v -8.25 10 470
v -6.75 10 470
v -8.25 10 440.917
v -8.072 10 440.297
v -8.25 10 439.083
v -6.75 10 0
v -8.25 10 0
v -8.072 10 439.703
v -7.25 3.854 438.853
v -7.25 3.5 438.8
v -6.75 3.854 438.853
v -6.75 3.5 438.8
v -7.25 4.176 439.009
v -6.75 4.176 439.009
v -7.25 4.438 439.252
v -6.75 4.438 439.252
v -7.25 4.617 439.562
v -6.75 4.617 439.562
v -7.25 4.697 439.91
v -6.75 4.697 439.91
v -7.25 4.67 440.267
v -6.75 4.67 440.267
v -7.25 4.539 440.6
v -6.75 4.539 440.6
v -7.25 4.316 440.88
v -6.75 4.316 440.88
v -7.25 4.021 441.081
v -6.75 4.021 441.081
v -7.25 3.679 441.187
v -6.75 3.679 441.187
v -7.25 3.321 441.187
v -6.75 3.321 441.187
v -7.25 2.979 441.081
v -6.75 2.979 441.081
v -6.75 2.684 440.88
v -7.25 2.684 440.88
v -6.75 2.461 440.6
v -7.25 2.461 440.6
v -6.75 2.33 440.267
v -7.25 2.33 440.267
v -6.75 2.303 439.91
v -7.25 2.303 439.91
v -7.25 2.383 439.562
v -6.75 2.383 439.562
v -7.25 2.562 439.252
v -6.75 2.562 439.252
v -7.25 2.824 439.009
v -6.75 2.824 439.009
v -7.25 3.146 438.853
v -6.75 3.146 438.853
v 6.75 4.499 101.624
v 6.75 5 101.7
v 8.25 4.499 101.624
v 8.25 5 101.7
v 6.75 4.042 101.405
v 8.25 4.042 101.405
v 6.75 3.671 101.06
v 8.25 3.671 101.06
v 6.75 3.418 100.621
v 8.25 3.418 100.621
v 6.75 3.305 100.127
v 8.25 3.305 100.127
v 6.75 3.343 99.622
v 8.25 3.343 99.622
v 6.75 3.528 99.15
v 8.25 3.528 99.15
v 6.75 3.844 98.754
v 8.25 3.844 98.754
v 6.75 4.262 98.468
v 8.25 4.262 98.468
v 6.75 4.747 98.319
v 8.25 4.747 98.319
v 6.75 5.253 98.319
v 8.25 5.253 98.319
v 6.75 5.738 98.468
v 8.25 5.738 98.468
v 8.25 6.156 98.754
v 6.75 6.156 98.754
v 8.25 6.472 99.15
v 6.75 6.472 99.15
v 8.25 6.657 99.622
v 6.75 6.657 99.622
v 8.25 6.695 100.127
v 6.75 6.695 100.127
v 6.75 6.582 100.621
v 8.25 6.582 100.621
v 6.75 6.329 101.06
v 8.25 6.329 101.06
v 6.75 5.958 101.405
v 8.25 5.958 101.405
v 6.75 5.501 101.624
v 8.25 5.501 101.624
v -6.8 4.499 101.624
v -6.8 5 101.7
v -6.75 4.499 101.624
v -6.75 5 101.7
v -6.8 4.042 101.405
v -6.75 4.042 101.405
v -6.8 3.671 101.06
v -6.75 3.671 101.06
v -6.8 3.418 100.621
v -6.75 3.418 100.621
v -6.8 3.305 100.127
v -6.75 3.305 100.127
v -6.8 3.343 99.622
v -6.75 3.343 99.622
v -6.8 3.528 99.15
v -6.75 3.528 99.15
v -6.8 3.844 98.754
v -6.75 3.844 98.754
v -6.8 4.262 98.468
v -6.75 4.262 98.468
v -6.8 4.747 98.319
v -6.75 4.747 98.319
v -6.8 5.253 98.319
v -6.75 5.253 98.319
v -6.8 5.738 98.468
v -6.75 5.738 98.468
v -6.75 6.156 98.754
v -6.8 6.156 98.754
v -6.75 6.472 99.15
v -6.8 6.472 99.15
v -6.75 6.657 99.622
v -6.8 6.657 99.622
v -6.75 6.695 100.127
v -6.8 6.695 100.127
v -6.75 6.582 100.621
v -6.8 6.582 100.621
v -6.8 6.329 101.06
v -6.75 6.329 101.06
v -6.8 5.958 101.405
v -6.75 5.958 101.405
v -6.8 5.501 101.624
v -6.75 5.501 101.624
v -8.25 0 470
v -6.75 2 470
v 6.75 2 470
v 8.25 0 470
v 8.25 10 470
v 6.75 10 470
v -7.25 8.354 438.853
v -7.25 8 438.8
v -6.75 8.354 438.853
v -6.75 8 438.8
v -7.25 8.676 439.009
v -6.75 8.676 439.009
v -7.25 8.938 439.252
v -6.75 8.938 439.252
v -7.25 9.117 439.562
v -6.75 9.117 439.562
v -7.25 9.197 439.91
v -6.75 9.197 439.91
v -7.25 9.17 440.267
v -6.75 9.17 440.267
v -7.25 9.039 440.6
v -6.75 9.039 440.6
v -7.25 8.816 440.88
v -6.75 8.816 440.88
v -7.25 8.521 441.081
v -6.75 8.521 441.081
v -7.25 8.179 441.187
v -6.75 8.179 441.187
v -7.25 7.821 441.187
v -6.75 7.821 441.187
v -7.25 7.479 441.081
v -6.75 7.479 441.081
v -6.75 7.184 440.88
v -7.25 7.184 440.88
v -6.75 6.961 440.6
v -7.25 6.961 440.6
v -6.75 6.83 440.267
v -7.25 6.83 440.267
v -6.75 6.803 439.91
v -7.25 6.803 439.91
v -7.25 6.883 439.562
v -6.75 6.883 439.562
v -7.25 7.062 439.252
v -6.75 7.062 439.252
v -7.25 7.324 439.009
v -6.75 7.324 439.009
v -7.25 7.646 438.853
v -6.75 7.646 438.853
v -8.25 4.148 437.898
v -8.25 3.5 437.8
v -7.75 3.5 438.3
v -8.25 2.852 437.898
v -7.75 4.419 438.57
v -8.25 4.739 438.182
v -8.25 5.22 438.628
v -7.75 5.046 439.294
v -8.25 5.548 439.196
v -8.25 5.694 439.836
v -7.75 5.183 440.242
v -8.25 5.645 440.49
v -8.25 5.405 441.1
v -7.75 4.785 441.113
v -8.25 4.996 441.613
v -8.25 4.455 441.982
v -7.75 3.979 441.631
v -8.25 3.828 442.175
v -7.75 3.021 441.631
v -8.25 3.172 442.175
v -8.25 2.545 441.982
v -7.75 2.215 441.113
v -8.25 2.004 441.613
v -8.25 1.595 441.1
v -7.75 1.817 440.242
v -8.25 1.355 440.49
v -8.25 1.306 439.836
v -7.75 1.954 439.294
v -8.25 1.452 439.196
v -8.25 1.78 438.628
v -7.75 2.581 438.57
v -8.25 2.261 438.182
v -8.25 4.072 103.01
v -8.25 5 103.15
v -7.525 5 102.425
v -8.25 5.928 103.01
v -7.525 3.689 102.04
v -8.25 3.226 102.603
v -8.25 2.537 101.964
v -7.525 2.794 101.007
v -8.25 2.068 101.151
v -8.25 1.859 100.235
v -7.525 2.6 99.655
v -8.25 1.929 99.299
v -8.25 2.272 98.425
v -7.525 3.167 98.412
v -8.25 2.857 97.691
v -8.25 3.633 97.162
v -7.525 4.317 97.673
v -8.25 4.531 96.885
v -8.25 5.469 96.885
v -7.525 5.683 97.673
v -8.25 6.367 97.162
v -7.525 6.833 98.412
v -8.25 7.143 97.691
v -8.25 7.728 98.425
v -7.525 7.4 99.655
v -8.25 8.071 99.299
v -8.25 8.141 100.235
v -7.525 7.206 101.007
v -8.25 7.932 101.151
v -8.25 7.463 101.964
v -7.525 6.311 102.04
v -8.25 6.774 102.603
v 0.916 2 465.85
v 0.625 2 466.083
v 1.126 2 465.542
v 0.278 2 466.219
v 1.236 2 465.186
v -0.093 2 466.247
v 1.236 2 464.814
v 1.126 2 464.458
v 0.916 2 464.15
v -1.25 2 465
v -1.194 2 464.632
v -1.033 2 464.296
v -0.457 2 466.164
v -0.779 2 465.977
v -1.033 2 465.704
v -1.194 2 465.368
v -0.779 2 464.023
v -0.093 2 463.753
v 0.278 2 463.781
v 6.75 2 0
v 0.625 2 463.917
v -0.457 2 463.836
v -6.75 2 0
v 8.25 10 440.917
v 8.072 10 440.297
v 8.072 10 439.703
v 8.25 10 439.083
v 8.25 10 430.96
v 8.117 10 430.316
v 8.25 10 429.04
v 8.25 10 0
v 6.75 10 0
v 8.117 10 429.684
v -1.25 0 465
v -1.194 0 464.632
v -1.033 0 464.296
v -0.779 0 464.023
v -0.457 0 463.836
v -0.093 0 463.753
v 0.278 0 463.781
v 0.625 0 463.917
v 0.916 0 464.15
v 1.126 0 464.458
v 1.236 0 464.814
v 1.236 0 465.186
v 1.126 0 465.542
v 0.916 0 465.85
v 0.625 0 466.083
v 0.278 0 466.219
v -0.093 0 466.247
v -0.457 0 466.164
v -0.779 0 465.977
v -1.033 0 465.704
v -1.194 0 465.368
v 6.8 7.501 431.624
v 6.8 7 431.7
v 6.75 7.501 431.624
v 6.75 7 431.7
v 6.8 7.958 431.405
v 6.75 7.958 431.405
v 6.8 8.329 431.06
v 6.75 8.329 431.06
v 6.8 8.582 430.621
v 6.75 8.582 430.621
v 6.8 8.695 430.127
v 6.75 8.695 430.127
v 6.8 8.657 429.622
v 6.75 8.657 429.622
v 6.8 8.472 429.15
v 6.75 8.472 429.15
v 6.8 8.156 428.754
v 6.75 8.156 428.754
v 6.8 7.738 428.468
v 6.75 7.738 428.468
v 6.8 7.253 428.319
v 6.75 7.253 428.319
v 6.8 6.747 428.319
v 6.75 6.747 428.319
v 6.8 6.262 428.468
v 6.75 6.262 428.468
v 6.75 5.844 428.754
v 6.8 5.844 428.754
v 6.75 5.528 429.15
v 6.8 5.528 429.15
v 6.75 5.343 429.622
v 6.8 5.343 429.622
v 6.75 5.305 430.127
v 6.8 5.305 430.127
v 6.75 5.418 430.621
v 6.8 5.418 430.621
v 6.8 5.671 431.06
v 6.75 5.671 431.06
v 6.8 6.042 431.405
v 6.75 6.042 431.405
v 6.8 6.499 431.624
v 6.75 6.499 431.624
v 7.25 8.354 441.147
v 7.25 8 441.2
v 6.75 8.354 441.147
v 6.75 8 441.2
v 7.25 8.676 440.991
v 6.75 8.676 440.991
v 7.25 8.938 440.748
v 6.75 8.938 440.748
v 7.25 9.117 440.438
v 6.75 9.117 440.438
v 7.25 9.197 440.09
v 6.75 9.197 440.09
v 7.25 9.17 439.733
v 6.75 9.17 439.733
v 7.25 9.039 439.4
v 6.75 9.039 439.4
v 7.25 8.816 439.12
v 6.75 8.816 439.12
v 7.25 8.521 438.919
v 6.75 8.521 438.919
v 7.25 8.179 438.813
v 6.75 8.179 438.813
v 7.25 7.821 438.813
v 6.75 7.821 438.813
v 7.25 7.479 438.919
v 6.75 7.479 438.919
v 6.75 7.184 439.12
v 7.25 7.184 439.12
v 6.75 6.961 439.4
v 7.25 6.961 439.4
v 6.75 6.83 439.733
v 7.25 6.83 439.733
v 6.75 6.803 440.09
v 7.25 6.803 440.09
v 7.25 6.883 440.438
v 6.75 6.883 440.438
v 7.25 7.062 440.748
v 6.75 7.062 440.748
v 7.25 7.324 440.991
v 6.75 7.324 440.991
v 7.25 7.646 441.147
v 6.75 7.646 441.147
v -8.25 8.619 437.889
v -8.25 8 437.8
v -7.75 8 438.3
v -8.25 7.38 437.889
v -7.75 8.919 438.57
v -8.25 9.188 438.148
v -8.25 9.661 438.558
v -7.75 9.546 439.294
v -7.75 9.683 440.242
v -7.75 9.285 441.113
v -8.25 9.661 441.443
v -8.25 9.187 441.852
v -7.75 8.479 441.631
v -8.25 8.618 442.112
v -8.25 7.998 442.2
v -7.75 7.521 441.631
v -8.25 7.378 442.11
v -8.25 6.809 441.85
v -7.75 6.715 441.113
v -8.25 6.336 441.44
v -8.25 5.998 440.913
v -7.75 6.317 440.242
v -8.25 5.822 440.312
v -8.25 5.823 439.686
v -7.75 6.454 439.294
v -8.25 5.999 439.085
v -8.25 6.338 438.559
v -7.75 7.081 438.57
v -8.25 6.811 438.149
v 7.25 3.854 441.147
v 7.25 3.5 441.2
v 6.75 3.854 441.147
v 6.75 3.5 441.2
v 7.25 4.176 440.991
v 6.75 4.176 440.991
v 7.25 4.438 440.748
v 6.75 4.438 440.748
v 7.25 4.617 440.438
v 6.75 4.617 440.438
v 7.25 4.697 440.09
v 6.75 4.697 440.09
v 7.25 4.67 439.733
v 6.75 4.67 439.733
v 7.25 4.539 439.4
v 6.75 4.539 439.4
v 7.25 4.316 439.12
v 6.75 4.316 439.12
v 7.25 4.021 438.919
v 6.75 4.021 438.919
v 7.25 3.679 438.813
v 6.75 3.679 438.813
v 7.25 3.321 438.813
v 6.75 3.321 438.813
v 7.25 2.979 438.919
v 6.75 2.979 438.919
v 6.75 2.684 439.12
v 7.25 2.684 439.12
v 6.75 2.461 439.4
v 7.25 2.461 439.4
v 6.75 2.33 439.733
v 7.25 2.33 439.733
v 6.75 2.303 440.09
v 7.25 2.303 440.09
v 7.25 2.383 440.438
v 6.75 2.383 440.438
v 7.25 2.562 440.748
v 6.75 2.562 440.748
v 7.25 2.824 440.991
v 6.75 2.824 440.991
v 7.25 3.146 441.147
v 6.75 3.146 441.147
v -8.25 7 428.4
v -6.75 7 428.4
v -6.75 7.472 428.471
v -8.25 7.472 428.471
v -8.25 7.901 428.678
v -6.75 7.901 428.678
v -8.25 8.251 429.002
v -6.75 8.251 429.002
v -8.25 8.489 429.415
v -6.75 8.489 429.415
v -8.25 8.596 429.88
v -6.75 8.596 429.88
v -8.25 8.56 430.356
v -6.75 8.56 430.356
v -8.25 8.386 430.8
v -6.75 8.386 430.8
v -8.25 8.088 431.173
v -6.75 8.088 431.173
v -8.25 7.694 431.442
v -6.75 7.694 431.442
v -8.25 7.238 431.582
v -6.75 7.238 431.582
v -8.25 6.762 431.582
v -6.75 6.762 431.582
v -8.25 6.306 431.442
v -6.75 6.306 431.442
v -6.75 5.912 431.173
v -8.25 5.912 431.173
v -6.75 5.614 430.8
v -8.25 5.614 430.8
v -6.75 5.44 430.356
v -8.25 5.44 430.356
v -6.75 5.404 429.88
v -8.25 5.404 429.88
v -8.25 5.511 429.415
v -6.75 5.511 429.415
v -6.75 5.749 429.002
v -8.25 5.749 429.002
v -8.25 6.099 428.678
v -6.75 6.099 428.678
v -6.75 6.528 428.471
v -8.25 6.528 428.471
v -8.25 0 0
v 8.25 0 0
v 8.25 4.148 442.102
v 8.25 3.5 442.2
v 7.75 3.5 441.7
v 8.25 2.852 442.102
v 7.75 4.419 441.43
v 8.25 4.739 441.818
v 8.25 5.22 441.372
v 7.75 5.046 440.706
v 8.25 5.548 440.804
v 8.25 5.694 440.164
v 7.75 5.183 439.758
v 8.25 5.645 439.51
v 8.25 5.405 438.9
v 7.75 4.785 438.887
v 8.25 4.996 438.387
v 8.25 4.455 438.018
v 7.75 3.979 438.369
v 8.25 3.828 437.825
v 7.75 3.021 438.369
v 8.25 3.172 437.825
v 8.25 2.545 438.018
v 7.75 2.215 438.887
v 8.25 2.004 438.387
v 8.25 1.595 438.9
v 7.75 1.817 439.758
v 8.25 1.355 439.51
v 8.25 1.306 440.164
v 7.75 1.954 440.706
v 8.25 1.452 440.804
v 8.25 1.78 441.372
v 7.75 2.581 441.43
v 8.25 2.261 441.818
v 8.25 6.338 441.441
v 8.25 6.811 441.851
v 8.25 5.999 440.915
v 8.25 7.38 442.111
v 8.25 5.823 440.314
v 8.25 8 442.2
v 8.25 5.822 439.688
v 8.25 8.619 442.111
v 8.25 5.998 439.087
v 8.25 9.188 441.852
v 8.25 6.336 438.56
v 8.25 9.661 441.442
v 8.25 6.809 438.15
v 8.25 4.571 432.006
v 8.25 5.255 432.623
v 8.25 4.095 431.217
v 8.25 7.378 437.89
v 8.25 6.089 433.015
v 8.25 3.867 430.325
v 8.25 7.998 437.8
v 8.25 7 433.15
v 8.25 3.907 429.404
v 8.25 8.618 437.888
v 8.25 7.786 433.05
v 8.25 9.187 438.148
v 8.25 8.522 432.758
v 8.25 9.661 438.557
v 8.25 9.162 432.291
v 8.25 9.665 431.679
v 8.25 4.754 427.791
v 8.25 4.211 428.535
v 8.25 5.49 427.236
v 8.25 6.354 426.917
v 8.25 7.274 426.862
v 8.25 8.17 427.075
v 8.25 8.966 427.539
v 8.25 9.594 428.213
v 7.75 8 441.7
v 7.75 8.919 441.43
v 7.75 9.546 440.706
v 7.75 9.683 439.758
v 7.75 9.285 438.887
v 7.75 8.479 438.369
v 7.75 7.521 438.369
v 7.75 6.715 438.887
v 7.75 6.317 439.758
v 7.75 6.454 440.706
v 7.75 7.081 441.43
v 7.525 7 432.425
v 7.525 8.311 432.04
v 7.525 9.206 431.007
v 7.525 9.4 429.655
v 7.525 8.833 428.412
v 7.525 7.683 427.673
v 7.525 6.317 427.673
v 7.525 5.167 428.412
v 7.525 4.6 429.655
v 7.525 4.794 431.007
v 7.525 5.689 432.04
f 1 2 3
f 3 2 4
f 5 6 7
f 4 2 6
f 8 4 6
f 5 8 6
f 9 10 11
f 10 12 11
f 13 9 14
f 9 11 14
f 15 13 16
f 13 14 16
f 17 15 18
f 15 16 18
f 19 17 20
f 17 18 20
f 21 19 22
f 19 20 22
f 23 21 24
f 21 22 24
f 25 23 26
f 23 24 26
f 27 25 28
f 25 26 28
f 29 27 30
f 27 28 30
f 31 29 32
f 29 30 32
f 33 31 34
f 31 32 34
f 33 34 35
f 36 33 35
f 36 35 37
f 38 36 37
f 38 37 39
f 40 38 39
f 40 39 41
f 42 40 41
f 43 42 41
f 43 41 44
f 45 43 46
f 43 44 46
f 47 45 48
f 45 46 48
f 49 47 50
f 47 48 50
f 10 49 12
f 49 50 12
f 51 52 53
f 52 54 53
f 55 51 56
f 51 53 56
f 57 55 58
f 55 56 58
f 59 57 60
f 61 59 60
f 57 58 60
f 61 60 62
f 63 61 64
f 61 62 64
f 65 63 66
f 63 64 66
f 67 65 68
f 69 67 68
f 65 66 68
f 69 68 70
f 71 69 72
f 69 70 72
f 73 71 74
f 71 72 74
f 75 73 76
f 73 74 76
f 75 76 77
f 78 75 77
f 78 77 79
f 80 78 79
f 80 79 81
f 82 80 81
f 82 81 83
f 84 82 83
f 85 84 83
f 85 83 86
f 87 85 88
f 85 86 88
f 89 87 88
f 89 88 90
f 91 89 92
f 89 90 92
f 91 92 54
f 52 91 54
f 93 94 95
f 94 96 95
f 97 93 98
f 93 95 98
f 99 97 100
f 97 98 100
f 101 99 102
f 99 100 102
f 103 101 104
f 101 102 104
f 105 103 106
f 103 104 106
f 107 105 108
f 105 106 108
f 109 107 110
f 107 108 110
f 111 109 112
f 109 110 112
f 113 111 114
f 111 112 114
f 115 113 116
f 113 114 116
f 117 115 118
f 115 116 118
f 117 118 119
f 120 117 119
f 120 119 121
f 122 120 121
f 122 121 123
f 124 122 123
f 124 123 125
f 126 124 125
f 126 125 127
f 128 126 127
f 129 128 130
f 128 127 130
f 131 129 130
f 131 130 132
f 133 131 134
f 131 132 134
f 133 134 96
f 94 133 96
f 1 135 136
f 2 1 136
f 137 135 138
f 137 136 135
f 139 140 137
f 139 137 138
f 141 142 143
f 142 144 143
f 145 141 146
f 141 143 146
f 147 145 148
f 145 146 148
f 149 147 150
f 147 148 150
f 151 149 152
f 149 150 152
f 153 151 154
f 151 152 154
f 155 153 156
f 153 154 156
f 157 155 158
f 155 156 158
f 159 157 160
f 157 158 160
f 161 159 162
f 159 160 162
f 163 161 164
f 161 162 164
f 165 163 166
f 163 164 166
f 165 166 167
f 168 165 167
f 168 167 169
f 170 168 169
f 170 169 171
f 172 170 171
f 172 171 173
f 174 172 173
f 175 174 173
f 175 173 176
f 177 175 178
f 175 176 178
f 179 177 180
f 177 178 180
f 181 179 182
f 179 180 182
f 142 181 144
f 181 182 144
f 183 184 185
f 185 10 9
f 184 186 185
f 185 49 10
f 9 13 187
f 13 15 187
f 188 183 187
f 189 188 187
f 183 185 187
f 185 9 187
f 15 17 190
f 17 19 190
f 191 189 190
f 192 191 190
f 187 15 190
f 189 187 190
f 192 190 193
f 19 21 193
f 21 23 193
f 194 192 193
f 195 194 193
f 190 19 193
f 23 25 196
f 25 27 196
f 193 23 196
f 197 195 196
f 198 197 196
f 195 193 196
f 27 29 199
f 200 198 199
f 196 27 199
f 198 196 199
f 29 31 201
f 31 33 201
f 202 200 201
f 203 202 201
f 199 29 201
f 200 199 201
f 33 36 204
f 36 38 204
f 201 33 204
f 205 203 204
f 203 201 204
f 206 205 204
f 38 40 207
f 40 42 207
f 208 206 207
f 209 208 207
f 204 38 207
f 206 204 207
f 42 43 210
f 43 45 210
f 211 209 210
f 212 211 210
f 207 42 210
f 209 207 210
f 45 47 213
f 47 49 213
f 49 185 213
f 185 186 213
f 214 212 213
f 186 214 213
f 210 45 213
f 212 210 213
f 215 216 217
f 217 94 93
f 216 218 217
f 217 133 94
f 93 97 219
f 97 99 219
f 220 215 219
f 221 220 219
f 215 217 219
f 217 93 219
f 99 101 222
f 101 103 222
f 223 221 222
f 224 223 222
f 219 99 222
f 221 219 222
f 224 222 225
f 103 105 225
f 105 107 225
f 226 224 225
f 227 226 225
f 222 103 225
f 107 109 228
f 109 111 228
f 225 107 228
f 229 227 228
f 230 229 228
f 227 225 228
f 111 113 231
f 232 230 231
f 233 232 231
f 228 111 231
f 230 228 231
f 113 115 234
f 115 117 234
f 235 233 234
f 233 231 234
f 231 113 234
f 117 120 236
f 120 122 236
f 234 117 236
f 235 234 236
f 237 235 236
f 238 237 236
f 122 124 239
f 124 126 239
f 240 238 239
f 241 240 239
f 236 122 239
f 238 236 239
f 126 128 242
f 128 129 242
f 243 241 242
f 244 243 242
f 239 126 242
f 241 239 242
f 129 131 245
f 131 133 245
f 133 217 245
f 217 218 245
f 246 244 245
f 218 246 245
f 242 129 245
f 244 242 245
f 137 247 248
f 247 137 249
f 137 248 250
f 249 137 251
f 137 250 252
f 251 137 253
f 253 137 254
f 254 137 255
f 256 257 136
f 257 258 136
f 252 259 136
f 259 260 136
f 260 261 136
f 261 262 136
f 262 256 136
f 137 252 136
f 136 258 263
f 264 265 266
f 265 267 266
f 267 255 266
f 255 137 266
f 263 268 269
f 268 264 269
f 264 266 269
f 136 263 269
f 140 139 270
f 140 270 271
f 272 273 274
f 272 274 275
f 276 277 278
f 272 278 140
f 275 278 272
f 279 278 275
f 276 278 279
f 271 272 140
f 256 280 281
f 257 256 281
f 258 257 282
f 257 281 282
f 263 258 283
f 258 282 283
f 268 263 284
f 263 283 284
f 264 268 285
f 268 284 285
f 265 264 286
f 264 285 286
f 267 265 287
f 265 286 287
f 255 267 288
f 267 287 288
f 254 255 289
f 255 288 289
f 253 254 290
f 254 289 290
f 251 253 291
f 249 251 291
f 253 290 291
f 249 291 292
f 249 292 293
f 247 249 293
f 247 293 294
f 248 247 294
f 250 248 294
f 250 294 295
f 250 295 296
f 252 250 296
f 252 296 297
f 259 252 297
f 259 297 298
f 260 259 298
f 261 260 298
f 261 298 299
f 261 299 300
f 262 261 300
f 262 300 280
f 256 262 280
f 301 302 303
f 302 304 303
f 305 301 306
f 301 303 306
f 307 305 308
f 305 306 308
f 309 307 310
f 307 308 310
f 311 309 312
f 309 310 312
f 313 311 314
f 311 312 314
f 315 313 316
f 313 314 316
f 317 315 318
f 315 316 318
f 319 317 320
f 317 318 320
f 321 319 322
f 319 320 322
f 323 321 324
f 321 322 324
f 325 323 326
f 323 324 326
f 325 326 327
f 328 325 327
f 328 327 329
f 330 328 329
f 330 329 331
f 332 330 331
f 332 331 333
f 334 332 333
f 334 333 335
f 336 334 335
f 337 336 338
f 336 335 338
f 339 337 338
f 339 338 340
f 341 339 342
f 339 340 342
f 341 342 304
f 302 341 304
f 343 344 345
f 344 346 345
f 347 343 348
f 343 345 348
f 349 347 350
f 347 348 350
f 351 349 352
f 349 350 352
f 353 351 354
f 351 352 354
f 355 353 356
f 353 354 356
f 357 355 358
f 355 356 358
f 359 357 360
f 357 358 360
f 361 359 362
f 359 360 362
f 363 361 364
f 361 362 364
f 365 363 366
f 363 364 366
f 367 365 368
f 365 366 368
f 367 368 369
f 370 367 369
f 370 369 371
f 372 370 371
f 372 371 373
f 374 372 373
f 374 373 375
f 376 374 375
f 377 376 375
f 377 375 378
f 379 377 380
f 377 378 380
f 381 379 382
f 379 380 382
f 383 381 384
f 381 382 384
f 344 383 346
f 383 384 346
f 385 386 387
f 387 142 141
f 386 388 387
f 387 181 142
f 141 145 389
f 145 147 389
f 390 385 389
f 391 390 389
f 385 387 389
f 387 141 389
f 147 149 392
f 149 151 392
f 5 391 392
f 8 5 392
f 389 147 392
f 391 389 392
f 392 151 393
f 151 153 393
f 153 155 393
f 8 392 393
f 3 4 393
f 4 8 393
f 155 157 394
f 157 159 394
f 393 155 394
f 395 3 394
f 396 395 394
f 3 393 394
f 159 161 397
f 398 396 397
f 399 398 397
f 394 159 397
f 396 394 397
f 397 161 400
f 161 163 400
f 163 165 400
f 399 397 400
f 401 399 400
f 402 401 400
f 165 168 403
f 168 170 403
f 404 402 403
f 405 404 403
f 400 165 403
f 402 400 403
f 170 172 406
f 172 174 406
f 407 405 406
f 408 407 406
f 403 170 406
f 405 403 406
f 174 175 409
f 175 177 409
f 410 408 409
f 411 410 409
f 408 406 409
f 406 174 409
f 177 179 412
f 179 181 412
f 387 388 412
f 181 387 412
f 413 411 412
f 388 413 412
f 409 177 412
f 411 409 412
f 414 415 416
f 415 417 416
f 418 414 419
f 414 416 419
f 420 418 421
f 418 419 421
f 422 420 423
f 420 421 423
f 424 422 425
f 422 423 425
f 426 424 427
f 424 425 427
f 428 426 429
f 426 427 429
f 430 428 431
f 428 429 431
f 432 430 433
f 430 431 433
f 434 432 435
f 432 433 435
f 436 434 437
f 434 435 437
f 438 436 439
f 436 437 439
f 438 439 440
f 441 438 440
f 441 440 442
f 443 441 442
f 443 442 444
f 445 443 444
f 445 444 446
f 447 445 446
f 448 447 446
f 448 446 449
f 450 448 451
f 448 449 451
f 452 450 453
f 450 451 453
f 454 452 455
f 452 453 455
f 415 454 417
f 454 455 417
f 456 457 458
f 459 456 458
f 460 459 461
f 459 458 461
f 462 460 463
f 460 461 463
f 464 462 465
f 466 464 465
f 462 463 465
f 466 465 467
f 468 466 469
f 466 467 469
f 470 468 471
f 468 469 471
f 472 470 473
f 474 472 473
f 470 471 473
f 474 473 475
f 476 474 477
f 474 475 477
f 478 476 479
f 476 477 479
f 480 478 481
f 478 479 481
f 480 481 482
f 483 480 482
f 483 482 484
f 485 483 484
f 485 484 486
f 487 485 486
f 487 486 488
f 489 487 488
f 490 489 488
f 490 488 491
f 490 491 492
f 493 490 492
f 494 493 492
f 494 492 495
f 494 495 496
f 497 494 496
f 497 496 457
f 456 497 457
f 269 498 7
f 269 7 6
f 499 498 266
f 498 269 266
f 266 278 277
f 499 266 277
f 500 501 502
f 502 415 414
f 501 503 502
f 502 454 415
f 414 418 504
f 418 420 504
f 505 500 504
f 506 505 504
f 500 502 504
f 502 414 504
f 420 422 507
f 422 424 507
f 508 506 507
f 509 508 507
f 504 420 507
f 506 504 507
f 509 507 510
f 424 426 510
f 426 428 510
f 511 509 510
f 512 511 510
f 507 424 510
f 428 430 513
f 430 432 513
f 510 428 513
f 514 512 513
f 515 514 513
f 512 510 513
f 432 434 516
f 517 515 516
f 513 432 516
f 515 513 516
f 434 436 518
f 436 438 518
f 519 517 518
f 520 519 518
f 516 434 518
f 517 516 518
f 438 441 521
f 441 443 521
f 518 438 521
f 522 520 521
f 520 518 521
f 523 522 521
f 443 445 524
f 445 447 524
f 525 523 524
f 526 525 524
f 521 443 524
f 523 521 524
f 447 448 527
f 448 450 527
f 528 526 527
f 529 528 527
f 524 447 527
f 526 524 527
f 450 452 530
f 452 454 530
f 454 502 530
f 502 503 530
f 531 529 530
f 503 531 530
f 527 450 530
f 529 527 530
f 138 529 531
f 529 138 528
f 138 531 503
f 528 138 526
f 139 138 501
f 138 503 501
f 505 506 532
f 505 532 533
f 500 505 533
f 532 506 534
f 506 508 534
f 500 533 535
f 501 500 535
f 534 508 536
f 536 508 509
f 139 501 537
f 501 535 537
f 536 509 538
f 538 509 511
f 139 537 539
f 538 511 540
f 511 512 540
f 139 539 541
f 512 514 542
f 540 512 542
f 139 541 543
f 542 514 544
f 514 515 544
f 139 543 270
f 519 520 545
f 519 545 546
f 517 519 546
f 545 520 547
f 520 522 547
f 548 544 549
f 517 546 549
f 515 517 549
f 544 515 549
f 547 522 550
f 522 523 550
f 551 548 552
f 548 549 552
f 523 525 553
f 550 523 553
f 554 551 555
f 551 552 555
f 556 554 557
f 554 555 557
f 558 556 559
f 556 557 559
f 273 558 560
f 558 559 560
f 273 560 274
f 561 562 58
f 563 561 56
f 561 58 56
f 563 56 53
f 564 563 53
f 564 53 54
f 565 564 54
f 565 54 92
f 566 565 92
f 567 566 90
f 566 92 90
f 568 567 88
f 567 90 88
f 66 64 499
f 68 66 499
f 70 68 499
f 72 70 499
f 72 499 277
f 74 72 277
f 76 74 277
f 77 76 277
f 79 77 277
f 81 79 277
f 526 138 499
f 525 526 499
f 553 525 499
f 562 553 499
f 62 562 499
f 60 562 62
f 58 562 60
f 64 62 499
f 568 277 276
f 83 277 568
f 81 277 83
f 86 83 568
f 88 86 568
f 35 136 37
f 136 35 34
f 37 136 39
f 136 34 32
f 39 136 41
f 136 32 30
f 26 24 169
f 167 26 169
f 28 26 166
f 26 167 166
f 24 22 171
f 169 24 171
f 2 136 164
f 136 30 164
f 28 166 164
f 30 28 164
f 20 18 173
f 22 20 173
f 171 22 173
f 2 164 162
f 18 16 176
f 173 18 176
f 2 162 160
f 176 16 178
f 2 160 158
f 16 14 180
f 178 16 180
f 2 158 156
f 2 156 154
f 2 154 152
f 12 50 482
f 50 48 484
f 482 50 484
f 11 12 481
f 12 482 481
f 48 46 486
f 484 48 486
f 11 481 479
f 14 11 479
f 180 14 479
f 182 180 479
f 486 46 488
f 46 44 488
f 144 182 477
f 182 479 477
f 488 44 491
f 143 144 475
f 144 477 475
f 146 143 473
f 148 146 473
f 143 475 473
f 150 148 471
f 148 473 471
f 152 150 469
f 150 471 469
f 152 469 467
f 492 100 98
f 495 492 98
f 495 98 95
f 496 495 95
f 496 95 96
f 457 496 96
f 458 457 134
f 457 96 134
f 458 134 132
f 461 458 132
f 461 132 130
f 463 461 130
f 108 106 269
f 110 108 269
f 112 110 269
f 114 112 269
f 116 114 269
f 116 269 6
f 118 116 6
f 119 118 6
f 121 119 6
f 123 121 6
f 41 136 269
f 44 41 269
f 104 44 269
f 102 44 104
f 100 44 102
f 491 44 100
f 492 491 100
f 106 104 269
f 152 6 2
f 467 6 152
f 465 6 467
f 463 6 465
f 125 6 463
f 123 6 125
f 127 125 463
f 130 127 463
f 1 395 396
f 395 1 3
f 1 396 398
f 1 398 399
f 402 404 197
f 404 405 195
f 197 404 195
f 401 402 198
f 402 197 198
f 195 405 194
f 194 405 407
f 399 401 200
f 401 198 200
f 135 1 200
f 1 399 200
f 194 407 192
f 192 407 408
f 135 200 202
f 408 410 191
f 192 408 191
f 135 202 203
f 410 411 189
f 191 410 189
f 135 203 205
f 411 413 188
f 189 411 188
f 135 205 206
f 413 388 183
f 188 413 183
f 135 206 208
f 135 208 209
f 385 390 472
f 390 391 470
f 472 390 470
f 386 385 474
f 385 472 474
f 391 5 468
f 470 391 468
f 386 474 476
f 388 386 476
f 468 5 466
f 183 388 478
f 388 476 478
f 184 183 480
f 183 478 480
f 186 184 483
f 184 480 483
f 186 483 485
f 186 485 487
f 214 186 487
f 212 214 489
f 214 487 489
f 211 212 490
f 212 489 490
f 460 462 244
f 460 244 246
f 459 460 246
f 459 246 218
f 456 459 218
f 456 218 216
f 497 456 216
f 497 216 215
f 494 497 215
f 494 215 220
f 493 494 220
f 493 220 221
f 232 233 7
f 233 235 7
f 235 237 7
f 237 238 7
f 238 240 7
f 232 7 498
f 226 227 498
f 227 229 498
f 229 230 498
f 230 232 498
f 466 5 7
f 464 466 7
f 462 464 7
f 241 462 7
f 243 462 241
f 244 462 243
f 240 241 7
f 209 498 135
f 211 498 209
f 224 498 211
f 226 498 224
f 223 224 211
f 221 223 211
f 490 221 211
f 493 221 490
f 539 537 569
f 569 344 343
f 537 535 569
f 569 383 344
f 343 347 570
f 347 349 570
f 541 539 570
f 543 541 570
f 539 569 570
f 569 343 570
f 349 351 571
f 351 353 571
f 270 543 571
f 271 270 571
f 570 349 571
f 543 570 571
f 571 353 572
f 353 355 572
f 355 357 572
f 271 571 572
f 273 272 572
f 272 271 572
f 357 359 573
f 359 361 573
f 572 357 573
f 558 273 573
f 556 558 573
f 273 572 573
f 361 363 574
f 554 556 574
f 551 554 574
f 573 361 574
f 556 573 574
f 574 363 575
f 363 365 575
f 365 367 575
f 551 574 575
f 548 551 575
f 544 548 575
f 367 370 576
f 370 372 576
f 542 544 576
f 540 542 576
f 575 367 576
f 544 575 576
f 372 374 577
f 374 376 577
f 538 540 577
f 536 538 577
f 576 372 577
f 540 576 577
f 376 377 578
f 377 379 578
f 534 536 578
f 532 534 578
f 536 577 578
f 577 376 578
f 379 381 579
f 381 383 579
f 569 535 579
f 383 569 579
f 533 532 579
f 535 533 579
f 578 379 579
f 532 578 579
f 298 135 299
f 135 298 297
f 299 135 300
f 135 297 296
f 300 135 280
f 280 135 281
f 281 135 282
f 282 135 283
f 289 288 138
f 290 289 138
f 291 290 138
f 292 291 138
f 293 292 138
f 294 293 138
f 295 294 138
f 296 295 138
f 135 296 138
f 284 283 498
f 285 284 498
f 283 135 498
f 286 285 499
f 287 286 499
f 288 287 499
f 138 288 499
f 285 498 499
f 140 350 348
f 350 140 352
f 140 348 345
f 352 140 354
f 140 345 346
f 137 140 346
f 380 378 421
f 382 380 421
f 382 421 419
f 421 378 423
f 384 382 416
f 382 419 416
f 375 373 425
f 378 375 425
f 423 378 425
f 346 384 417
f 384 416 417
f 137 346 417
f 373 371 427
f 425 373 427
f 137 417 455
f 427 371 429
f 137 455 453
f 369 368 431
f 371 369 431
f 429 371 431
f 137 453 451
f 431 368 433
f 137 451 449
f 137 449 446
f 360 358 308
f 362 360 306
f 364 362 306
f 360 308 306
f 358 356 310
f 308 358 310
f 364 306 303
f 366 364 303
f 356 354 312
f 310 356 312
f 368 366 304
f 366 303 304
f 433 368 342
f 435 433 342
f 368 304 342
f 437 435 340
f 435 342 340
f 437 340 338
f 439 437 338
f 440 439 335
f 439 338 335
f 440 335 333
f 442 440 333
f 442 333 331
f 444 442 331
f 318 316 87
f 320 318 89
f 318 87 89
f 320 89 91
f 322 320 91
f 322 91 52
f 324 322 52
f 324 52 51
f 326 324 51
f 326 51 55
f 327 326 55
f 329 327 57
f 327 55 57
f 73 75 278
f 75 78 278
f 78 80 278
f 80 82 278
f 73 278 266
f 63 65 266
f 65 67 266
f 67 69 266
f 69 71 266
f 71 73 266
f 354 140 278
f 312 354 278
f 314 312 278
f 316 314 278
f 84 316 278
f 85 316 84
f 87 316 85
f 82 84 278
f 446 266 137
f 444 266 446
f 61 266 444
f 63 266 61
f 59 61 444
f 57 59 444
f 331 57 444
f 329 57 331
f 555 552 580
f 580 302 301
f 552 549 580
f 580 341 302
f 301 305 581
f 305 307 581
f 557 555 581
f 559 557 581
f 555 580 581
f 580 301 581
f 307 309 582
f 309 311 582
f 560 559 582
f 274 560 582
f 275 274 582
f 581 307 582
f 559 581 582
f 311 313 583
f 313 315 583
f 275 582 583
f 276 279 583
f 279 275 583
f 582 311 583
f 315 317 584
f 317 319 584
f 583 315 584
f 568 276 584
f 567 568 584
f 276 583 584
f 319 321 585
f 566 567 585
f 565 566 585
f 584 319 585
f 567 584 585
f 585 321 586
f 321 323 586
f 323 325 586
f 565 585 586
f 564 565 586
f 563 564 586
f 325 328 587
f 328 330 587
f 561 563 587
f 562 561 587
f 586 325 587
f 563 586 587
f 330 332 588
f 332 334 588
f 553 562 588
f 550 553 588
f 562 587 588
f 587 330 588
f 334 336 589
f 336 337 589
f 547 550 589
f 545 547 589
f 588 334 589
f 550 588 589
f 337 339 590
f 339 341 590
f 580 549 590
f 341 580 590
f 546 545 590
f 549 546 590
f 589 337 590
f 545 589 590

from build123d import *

# Parameters (mm, degrees)
BOSS_EXTRU_1_DEPTH                                   = 470
ESQUISSE2_R                                          = 1.15
ESQUISSE2_R_2                                        = 1.6
ENL_V_MAT_EXTRU_1_DEPTH                              = 471.395843944
TROU_POUR_TARAUDAGE_POUR_TROU_TARAUD_M3_D            = 2.5
FORMSENKUNG_F_R_M2_SENKSCHRAUBE_MIT_SCHL_D           = 2.4
FORMSENKUNG_F_R_M2_SENKSCHRAUBE_MIT_SCHL_DEPTH       = 5
FORMSENKUNG_F_R_M2_SENKSCHRAUBE_MIT_SCHL_CSINK_D     = 4.4
FORMSENKUNG_F_R_M2_SENKSCHRAUBE_MIT_SCHL_CSINK_ANGLE = 90
FORMSENKUNG_F_R_M2_SENKSCHRAUBE_MIT_SCHL_TIP         = 0.721032743
FORMSENKUNG_F_R_M2_SENKSCHRAUBE_MIT_2_D              = 2.4
FORMSENKUNG_F_R_M2_SENKSCHRAUBE_MIT_2_DEPTH          = 5
FORMSENKUNG_F_R_M2_SENKSCHRAUBE_MIT_2_CSINK_D        = 4.4
FORMSENKUNG_F_R_M2_SENKSCHRAUBE_MIT_2_CSINK_ANGLE    = 90
FORMSENKUNG_F_R_M2_SENKSCHRAUBE_MIT_2_TIP            = 0.721032743
FORMSENKUNG_F_R_M3_SENKSCHRAUBE_MIT_SCHL_D           = 3.4
FORMSENKUNG_F_R_M3_SENKSCHRAUBE_MIT_SCHL_DEPTH       = 5
FORMSENKUNG_F_R_M3_SENKSCHRAUBE_MIT_SCHL_CSINK_D     = 6.3
FORMSENKUNG_F_R_M3_SENKSCHRAUBE_MIT_SCHL_CSINK_ANGLE = 90
FORMSENKUNG_F_R_M3_SENKSCHRAUBE_MIT_SCHL_TIP         = 1.021463052
FORMSENKUNG_F_R_M3_SENKSCHRAUBE_MIT_2_D              = 3.4
FORMSENKUNG_F_R_M3_SENKSCHRAUBE_MIT_2_CSINK_D        = 6.3
FORMSENKUNG_F_R_M3_SENKSCHRAUBE_MIT_2_CSINK_ANGLE    = 90


with BuildPart() as part:
    # Esquisse1 → Boss.-Extru.1 (new body)
    with BuildSketch(Plane.XY):
        Polygon((-8.25, 0), (8.25, 0), (8.25, 10), (6.75, 10), (6.75, 2), (-6.75, 2), (-6.75, 10), (-8.25, 10), align=None)
    extrude(amount=BOSS_EXTRU_1_DEPTH)

    # Esquisse2 → Enlèv. mat.-Extru.1 (cut, through all)
    with BuildSketch(Plane(origin=(8.25, 0, 0), x_dir=(0, 0, -1), z_dir=(1, 0, 0))):
        with Locations((-440, 8)):
            Circle(ESQUISSE2_R)
        with Locations((-440, 3.5)):
            Circle(ESQUISSE2_R)
        with Locations((-430, 7)):
            Circle(ESQUISSE2_R_2)
    extrude(amount=-ENL_V_MAT_EXTRU_1_DEPTH, mode=Mode.SUBTRACT)

    # Trou pour taraudage pour trou taraudé M31 (through all)
    with Locations(Plane(origin=(0, 2, 0), x_dir=(1, 0, 0), z_dir=(0, 1, 0))):
        with Locations((0, -465)):
            Hole(TROU_POUR_TARAUDAGE_POUR_TROU_TARAUD_M3_D / 2)

    # Formsenkung f_r M2 Senkschraube mit Schl
    with Locations(Plane(origin=(8.25, 0, 0), x_dir=(0, 0, -1), z_dir=(1, 0, 0))):
        with Locations((-440, 3.5), (-440, 8)):
            CounterSinkHole(FORMSENKUNG_F_R_M2_SENKSCHRAUBE_MIT_SCHL_D / 2, FORMSENKUNG_F_R_M2_SENKSCHRAUBE_MIT_SCHL_CSINK_D / 2, depth=FORMSENKUNG_F_R_M2_SENKSCHRAUBE_MIT_SCHL_DEPTH, counter_sink_angle=FORMSENKUNG_F_R_M2_SENKSCHRAUBE_MIT_SCHL_CSINK_ANGLE)
            with Locations((0, 0, -(FORMSENKUNG_F_R_M2_SENKSCHRAUBE_MIT_SCHL_DEPTH + FORMSENKUNG_F_R_M2_SENKSCHRAUBE_MIT_SCHL_TIP / 2))):  # 118° drill point
                Cone(0, FORMSENKUNG_F_R_M2_SENKSCHRAUBE_MIT_SCHL_D / 2, FORMSENKUNG_F_R_M2_SENKSCHRAUBE_MIT_SCHL_TIP, mode=Mode.SUBTRACT)

    # Formsenkung f_r M2 Senkschraube mit  2
    with Locations(Plane.ZY.offset(8.25)):
        with Locations((440, 8), (440, 3.5)):
            CounterSinkHole(FORMSENKUNG_F_R_M2_SENKSCHRAUBE_MIT_2_D / 2, FORMSENKUNG_F_R_M2_SENKSCHRAUBE_MIT_2_CSINK_D / 2, depth=FORMSENKUNG_F_R_M2_SENKSCHRAUBE_MIT_2_DEPTH, counter_sink_angle=FORMSENKUNG_F_R_M2_SENKSCHRAUBE_MIT_2_CSINK_ANGLE)
            with Locations((0, 0, -(FORMSENKUNG_F_R_M2_SENKSCHRAUBE_MIT_2_DEPTH + FORMSENKUNG_F_R_M2_SENKSCHRAUBE_MIT_2_TIP / 2))):  # 118° drill point
                Cone(0, FORMSENKUNG_F_R_M2_SENKSCHRAUBE_MIT_2_D / 2, FORMSENKUNG_F_R_M2_SENKSCHRAUBE_MIT_2_TIP, mode=Mode.SUBTRACT)

    # Formsenkung f_r M3 Senkschraube mit Schl
    with Locations(Plane(origin=(8.25, 0, 0), x_dir=(0, 0, -1), z_dir=(1, 0, 0))):
        with Locations((-430, 7)):
            CounterSinkHole(FORMSENKUNG_F_R_M3_SENKSCHRAUBE_MIT_SCHL_D / 2, FORMSENKUNG_F_R_M3_SENKSCHRAUBE_MIT_SCHL_CSINK_D / 2, depth=FORMSENKUNG_F_R_M3_SENKSCHRAUBE_MIT_SCHL_DEPTH, counter_sink_angle=FORMSENKUNG_F_R_M3_SENKSCHRAUBE_MIT_SCHL_CSINK_ANGLE)
            with Locations((0, 0, -(FORMSENKUNG_F_R_M3_SENKSCHRAUBE_MIT_SCHL_DEPTH + FORMSENKUNG_F_R_M3_SENKSCHRAUBE_MIT_SCHL_TIP / 2))):  # 118° drill point
                Cone(0, FORMSENKUNG_F_R_M3_SENKSCHRAUBE_MIT_SCHL_D / 2, FORMSENKUNG_F_R_M3_SENKSCHRAUBE_MIT_SCHL_TIP, mode=Mode.SUBTRACT)

    # Formsenkung f_r M3 Senkschraube mit  2 (through all)
    with Locations(Plane(origin=(-8.25, -1.5, 0), x_dir=(0, 0, -1), z_dir=(-1, 0, 0))):
        with Locations((-100, -6.5)):
            CounterSinkHole(FORMSENKUNG_F_R_M3_SENKSCHRAUBE_MIT_2_D / 2, FORMSENKUNG_F_R_M3_SENKSCHRAUBE_MIT_2_CSINK_D / 2, counter_sink_angle=FORMSENKUNG_F_R_M3_SENKSCHRAUBE_MIT_2_CSINK_ANGLE)


solid = part.part
